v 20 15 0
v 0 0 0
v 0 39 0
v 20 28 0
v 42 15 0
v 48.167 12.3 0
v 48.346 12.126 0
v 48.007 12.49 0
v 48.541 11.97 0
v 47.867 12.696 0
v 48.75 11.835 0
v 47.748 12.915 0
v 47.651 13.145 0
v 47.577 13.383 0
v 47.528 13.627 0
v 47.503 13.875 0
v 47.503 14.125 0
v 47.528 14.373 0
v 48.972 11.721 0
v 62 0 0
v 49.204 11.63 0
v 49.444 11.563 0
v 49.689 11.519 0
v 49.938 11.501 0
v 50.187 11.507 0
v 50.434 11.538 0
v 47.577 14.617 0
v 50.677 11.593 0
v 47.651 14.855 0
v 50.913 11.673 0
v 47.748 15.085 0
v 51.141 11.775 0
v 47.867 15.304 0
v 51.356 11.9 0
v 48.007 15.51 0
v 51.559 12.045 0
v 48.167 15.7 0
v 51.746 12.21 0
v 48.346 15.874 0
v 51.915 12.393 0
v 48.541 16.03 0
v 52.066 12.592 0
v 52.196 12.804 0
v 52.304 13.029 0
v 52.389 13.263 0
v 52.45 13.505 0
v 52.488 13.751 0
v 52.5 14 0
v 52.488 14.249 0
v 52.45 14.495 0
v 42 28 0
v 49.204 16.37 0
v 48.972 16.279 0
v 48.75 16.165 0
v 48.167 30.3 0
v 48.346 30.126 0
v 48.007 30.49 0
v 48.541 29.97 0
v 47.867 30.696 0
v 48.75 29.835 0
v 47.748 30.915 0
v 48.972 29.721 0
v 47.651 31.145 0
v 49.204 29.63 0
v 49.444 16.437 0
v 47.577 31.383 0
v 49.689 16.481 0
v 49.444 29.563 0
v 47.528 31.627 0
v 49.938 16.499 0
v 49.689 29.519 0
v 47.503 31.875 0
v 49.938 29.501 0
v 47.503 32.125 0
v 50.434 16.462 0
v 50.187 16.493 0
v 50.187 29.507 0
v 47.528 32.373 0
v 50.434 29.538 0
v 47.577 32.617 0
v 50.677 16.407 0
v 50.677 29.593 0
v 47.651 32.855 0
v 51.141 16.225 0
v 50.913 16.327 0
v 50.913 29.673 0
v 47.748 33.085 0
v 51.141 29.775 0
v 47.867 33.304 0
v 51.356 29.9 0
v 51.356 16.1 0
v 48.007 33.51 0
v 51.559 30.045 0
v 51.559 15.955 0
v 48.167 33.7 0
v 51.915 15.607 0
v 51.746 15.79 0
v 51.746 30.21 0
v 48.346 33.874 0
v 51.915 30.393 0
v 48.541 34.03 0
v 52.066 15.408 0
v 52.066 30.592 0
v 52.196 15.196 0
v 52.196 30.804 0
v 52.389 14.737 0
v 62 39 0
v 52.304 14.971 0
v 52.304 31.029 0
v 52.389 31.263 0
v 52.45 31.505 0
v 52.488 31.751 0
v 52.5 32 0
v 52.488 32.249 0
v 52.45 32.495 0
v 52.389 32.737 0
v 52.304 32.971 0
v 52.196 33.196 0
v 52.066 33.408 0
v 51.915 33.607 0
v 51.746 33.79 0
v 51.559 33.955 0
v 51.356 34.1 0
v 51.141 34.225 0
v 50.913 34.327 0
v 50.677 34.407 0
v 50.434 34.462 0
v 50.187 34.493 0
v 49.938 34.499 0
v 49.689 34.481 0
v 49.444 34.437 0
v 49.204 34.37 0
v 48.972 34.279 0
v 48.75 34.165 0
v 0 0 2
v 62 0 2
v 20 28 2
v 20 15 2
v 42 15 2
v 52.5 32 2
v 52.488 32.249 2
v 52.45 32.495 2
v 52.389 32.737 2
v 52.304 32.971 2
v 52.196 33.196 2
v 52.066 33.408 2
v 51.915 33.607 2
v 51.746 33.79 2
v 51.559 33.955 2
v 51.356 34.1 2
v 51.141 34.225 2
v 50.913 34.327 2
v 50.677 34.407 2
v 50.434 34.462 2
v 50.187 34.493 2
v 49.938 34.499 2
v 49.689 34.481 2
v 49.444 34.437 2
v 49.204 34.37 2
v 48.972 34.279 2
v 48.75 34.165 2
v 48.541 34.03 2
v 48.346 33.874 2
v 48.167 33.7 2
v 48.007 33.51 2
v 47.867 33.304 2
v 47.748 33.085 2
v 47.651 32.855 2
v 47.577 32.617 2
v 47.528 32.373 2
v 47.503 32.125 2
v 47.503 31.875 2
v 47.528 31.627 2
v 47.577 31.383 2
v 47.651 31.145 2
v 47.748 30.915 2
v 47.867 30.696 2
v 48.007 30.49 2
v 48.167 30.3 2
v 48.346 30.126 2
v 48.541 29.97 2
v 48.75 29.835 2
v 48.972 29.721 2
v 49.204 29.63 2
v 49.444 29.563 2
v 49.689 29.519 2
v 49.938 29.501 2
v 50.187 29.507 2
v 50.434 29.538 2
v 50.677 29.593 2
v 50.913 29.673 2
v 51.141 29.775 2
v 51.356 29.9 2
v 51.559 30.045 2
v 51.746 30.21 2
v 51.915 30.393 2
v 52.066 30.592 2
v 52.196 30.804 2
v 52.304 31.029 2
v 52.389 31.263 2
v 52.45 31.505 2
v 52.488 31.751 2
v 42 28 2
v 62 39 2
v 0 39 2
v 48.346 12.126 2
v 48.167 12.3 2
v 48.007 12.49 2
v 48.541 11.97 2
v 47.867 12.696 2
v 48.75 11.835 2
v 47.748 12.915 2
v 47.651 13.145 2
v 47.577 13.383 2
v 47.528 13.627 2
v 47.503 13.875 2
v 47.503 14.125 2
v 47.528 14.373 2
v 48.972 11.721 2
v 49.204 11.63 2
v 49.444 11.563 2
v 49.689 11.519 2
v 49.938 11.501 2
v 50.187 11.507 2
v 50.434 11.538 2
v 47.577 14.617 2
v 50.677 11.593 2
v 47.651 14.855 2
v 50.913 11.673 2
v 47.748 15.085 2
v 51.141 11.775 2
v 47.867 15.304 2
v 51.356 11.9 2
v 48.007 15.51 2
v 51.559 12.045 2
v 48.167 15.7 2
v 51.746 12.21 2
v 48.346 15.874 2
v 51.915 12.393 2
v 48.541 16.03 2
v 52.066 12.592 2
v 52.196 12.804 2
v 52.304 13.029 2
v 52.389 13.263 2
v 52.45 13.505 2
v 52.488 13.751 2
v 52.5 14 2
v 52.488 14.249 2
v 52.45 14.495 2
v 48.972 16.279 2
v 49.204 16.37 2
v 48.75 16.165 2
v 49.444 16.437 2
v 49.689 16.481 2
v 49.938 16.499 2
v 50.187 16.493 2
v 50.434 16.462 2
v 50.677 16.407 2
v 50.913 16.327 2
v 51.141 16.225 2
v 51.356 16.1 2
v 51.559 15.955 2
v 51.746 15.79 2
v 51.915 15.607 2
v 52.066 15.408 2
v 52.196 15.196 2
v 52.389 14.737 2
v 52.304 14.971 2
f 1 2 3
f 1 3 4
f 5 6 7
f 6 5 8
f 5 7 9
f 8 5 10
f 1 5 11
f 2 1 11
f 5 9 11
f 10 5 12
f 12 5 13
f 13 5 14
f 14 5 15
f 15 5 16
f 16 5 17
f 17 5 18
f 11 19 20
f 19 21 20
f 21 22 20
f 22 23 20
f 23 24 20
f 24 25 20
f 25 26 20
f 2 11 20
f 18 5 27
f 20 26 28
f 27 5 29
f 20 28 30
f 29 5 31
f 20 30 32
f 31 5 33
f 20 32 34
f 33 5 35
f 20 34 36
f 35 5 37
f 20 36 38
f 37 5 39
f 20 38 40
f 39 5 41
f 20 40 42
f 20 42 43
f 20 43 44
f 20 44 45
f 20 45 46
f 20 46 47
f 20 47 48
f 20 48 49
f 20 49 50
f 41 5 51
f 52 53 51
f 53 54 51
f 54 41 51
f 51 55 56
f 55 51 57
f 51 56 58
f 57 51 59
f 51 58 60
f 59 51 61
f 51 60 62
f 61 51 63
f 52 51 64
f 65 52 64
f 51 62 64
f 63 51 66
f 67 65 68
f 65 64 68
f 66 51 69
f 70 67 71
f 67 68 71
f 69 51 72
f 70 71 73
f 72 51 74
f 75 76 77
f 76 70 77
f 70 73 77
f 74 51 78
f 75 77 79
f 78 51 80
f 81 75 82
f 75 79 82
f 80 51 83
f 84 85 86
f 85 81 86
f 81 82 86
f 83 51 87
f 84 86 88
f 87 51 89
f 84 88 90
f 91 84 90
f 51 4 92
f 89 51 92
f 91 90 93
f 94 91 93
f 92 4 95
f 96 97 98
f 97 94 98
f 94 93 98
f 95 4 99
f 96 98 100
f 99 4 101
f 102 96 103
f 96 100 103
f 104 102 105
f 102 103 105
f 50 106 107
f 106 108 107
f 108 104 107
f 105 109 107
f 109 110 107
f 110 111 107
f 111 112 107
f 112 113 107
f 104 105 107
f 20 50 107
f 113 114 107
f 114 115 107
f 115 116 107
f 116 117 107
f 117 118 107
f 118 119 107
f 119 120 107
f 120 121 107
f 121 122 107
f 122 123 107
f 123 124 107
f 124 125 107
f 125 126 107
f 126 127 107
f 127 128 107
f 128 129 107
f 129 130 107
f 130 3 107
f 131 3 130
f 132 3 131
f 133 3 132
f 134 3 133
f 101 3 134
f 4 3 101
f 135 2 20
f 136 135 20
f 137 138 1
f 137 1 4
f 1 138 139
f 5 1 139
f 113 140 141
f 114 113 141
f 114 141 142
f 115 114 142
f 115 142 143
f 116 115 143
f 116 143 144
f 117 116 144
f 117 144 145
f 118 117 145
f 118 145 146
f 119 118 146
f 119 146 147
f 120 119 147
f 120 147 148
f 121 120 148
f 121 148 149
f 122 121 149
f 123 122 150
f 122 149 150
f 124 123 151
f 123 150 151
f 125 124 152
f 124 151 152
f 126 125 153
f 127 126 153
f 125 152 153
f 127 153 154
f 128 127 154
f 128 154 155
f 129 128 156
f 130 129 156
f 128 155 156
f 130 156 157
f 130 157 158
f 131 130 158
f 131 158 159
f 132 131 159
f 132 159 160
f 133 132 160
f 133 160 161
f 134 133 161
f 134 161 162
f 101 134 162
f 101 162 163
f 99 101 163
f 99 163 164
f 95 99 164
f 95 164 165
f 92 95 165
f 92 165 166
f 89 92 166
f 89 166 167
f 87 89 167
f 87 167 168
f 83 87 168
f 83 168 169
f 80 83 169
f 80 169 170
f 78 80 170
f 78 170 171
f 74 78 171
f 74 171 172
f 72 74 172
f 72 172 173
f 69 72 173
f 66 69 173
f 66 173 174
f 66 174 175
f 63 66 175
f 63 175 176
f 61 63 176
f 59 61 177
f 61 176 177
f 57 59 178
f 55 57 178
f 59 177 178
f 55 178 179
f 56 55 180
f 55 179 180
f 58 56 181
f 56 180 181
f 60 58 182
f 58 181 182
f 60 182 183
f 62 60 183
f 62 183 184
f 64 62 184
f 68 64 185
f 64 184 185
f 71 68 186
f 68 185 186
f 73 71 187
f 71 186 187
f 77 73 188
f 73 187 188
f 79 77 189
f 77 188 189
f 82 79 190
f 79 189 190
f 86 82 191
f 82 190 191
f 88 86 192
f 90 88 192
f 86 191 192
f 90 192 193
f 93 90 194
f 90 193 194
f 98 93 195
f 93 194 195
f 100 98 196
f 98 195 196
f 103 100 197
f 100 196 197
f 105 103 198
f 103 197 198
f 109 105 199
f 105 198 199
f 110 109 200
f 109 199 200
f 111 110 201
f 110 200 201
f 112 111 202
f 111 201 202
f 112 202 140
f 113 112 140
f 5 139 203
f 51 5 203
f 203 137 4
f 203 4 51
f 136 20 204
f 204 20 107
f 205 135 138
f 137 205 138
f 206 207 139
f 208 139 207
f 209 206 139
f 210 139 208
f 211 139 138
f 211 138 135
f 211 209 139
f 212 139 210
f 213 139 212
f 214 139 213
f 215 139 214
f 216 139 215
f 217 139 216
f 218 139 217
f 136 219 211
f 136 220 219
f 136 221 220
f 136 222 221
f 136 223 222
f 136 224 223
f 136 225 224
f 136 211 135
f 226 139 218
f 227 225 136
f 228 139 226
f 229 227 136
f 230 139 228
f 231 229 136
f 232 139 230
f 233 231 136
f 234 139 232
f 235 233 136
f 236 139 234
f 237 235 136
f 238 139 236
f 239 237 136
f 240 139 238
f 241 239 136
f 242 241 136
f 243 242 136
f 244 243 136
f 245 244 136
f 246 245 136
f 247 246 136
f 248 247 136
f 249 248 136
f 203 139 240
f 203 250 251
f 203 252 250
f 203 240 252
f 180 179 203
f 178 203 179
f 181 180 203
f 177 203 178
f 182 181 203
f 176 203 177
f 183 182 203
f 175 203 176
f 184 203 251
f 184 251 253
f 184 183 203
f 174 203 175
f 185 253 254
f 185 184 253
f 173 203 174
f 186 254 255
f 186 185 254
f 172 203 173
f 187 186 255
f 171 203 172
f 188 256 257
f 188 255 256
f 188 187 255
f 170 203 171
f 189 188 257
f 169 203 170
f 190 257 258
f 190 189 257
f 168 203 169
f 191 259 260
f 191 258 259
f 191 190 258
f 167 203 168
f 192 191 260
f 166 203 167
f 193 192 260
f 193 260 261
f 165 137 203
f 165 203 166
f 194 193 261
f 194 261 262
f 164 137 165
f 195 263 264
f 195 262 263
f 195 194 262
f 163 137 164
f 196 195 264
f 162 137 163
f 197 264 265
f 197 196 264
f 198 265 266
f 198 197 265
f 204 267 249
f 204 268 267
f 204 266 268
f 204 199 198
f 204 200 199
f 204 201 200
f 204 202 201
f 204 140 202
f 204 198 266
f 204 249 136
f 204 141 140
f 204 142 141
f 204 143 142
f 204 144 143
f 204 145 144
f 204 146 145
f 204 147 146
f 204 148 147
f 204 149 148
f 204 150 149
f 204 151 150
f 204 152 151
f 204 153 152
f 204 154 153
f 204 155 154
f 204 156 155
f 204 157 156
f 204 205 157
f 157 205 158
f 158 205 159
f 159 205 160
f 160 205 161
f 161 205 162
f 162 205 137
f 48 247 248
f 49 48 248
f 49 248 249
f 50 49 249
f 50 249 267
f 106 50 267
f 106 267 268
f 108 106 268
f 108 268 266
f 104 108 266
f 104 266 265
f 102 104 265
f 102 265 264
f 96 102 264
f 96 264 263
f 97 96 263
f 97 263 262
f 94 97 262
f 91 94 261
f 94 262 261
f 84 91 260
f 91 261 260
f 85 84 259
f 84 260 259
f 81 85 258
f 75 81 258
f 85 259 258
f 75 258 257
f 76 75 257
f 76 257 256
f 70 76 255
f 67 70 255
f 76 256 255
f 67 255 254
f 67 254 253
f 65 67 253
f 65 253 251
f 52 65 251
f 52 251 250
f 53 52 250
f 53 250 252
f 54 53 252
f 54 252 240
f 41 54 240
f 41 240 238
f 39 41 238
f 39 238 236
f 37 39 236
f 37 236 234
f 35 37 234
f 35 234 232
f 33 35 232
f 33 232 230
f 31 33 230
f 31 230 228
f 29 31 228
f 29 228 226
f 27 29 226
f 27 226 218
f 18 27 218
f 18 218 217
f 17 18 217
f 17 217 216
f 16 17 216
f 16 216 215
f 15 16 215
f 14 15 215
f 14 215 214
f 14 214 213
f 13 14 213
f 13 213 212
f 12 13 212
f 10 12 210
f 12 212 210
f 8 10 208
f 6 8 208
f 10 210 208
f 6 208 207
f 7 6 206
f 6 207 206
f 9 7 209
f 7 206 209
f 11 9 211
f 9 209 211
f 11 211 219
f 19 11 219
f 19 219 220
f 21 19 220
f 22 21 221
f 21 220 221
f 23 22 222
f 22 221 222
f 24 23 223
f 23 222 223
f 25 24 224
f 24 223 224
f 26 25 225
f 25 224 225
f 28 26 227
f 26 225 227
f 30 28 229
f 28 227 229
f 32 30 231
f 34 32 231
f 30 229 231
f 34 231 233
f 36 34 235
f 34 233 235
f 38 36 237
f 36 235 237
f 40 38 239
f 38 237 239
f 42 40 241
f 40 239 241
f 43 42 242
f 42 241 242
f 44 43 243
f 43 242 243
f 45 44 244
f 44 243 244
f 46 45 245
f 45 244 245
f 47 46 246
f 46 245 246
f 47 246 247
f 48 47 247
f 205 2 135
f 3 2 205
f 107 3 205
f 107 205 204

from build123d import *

# Parameters (mm, degrees)
SKETCH_W        = 62
SKETCH_H        = 39
PAD_DEPTH       = 2
SKETCH001_W     = 22
SKETCH001_H     = 13
POCKET_DEPTH    = 2.001
SKETCH002_R     = 2.5
POCKET001_DEPTH = 5
SKETCH003_R     = 2.5
POCKET002_DEPTH = 5


with BuildPart() as part:
    # Sketch → Pad (new body)
    with BuildSketch(Plane.XY):
        with Locations((31, 19.5)):
            Rectangle(SKETCH_W, SKETCH_H)
    extrude(amount=PAD_DEPTH)

    # Sketch001 (on Face6 of Pad) → Pocket (cut, through all)
    with BuildSketch(Plane.XY.offset(2)):
        with Locations((31, 21.5)):
            Rectangle(SKETCH001_W, SKETCH001_H)
    extrude(amount=-POCKET_DEPTH, mode=Mode.SUBTRACT)

    # Sketch002 (on Face5 of Pocket) → Pocket001 (cut)
    with BuildSketch(Plane.XY.offset(2)):
        with Locations((50, 32)):
            Circle(SKETCH002_R)
    extrude(amount=-POCKET001_DEPTH, mode=Mode.SUBTRACT)

    # Sketch003 (on Face5 of Pocket001) → Pocket002 (cut)
    with BuildSketch(Plane.XY.offset(2)):
        with Locations((50, 14)):
            Circle(SKETCH003_R)
    extrude(amount=-POCKET002_DEPTH, mode=Mode.SUBTRACT)


solid = part.part
